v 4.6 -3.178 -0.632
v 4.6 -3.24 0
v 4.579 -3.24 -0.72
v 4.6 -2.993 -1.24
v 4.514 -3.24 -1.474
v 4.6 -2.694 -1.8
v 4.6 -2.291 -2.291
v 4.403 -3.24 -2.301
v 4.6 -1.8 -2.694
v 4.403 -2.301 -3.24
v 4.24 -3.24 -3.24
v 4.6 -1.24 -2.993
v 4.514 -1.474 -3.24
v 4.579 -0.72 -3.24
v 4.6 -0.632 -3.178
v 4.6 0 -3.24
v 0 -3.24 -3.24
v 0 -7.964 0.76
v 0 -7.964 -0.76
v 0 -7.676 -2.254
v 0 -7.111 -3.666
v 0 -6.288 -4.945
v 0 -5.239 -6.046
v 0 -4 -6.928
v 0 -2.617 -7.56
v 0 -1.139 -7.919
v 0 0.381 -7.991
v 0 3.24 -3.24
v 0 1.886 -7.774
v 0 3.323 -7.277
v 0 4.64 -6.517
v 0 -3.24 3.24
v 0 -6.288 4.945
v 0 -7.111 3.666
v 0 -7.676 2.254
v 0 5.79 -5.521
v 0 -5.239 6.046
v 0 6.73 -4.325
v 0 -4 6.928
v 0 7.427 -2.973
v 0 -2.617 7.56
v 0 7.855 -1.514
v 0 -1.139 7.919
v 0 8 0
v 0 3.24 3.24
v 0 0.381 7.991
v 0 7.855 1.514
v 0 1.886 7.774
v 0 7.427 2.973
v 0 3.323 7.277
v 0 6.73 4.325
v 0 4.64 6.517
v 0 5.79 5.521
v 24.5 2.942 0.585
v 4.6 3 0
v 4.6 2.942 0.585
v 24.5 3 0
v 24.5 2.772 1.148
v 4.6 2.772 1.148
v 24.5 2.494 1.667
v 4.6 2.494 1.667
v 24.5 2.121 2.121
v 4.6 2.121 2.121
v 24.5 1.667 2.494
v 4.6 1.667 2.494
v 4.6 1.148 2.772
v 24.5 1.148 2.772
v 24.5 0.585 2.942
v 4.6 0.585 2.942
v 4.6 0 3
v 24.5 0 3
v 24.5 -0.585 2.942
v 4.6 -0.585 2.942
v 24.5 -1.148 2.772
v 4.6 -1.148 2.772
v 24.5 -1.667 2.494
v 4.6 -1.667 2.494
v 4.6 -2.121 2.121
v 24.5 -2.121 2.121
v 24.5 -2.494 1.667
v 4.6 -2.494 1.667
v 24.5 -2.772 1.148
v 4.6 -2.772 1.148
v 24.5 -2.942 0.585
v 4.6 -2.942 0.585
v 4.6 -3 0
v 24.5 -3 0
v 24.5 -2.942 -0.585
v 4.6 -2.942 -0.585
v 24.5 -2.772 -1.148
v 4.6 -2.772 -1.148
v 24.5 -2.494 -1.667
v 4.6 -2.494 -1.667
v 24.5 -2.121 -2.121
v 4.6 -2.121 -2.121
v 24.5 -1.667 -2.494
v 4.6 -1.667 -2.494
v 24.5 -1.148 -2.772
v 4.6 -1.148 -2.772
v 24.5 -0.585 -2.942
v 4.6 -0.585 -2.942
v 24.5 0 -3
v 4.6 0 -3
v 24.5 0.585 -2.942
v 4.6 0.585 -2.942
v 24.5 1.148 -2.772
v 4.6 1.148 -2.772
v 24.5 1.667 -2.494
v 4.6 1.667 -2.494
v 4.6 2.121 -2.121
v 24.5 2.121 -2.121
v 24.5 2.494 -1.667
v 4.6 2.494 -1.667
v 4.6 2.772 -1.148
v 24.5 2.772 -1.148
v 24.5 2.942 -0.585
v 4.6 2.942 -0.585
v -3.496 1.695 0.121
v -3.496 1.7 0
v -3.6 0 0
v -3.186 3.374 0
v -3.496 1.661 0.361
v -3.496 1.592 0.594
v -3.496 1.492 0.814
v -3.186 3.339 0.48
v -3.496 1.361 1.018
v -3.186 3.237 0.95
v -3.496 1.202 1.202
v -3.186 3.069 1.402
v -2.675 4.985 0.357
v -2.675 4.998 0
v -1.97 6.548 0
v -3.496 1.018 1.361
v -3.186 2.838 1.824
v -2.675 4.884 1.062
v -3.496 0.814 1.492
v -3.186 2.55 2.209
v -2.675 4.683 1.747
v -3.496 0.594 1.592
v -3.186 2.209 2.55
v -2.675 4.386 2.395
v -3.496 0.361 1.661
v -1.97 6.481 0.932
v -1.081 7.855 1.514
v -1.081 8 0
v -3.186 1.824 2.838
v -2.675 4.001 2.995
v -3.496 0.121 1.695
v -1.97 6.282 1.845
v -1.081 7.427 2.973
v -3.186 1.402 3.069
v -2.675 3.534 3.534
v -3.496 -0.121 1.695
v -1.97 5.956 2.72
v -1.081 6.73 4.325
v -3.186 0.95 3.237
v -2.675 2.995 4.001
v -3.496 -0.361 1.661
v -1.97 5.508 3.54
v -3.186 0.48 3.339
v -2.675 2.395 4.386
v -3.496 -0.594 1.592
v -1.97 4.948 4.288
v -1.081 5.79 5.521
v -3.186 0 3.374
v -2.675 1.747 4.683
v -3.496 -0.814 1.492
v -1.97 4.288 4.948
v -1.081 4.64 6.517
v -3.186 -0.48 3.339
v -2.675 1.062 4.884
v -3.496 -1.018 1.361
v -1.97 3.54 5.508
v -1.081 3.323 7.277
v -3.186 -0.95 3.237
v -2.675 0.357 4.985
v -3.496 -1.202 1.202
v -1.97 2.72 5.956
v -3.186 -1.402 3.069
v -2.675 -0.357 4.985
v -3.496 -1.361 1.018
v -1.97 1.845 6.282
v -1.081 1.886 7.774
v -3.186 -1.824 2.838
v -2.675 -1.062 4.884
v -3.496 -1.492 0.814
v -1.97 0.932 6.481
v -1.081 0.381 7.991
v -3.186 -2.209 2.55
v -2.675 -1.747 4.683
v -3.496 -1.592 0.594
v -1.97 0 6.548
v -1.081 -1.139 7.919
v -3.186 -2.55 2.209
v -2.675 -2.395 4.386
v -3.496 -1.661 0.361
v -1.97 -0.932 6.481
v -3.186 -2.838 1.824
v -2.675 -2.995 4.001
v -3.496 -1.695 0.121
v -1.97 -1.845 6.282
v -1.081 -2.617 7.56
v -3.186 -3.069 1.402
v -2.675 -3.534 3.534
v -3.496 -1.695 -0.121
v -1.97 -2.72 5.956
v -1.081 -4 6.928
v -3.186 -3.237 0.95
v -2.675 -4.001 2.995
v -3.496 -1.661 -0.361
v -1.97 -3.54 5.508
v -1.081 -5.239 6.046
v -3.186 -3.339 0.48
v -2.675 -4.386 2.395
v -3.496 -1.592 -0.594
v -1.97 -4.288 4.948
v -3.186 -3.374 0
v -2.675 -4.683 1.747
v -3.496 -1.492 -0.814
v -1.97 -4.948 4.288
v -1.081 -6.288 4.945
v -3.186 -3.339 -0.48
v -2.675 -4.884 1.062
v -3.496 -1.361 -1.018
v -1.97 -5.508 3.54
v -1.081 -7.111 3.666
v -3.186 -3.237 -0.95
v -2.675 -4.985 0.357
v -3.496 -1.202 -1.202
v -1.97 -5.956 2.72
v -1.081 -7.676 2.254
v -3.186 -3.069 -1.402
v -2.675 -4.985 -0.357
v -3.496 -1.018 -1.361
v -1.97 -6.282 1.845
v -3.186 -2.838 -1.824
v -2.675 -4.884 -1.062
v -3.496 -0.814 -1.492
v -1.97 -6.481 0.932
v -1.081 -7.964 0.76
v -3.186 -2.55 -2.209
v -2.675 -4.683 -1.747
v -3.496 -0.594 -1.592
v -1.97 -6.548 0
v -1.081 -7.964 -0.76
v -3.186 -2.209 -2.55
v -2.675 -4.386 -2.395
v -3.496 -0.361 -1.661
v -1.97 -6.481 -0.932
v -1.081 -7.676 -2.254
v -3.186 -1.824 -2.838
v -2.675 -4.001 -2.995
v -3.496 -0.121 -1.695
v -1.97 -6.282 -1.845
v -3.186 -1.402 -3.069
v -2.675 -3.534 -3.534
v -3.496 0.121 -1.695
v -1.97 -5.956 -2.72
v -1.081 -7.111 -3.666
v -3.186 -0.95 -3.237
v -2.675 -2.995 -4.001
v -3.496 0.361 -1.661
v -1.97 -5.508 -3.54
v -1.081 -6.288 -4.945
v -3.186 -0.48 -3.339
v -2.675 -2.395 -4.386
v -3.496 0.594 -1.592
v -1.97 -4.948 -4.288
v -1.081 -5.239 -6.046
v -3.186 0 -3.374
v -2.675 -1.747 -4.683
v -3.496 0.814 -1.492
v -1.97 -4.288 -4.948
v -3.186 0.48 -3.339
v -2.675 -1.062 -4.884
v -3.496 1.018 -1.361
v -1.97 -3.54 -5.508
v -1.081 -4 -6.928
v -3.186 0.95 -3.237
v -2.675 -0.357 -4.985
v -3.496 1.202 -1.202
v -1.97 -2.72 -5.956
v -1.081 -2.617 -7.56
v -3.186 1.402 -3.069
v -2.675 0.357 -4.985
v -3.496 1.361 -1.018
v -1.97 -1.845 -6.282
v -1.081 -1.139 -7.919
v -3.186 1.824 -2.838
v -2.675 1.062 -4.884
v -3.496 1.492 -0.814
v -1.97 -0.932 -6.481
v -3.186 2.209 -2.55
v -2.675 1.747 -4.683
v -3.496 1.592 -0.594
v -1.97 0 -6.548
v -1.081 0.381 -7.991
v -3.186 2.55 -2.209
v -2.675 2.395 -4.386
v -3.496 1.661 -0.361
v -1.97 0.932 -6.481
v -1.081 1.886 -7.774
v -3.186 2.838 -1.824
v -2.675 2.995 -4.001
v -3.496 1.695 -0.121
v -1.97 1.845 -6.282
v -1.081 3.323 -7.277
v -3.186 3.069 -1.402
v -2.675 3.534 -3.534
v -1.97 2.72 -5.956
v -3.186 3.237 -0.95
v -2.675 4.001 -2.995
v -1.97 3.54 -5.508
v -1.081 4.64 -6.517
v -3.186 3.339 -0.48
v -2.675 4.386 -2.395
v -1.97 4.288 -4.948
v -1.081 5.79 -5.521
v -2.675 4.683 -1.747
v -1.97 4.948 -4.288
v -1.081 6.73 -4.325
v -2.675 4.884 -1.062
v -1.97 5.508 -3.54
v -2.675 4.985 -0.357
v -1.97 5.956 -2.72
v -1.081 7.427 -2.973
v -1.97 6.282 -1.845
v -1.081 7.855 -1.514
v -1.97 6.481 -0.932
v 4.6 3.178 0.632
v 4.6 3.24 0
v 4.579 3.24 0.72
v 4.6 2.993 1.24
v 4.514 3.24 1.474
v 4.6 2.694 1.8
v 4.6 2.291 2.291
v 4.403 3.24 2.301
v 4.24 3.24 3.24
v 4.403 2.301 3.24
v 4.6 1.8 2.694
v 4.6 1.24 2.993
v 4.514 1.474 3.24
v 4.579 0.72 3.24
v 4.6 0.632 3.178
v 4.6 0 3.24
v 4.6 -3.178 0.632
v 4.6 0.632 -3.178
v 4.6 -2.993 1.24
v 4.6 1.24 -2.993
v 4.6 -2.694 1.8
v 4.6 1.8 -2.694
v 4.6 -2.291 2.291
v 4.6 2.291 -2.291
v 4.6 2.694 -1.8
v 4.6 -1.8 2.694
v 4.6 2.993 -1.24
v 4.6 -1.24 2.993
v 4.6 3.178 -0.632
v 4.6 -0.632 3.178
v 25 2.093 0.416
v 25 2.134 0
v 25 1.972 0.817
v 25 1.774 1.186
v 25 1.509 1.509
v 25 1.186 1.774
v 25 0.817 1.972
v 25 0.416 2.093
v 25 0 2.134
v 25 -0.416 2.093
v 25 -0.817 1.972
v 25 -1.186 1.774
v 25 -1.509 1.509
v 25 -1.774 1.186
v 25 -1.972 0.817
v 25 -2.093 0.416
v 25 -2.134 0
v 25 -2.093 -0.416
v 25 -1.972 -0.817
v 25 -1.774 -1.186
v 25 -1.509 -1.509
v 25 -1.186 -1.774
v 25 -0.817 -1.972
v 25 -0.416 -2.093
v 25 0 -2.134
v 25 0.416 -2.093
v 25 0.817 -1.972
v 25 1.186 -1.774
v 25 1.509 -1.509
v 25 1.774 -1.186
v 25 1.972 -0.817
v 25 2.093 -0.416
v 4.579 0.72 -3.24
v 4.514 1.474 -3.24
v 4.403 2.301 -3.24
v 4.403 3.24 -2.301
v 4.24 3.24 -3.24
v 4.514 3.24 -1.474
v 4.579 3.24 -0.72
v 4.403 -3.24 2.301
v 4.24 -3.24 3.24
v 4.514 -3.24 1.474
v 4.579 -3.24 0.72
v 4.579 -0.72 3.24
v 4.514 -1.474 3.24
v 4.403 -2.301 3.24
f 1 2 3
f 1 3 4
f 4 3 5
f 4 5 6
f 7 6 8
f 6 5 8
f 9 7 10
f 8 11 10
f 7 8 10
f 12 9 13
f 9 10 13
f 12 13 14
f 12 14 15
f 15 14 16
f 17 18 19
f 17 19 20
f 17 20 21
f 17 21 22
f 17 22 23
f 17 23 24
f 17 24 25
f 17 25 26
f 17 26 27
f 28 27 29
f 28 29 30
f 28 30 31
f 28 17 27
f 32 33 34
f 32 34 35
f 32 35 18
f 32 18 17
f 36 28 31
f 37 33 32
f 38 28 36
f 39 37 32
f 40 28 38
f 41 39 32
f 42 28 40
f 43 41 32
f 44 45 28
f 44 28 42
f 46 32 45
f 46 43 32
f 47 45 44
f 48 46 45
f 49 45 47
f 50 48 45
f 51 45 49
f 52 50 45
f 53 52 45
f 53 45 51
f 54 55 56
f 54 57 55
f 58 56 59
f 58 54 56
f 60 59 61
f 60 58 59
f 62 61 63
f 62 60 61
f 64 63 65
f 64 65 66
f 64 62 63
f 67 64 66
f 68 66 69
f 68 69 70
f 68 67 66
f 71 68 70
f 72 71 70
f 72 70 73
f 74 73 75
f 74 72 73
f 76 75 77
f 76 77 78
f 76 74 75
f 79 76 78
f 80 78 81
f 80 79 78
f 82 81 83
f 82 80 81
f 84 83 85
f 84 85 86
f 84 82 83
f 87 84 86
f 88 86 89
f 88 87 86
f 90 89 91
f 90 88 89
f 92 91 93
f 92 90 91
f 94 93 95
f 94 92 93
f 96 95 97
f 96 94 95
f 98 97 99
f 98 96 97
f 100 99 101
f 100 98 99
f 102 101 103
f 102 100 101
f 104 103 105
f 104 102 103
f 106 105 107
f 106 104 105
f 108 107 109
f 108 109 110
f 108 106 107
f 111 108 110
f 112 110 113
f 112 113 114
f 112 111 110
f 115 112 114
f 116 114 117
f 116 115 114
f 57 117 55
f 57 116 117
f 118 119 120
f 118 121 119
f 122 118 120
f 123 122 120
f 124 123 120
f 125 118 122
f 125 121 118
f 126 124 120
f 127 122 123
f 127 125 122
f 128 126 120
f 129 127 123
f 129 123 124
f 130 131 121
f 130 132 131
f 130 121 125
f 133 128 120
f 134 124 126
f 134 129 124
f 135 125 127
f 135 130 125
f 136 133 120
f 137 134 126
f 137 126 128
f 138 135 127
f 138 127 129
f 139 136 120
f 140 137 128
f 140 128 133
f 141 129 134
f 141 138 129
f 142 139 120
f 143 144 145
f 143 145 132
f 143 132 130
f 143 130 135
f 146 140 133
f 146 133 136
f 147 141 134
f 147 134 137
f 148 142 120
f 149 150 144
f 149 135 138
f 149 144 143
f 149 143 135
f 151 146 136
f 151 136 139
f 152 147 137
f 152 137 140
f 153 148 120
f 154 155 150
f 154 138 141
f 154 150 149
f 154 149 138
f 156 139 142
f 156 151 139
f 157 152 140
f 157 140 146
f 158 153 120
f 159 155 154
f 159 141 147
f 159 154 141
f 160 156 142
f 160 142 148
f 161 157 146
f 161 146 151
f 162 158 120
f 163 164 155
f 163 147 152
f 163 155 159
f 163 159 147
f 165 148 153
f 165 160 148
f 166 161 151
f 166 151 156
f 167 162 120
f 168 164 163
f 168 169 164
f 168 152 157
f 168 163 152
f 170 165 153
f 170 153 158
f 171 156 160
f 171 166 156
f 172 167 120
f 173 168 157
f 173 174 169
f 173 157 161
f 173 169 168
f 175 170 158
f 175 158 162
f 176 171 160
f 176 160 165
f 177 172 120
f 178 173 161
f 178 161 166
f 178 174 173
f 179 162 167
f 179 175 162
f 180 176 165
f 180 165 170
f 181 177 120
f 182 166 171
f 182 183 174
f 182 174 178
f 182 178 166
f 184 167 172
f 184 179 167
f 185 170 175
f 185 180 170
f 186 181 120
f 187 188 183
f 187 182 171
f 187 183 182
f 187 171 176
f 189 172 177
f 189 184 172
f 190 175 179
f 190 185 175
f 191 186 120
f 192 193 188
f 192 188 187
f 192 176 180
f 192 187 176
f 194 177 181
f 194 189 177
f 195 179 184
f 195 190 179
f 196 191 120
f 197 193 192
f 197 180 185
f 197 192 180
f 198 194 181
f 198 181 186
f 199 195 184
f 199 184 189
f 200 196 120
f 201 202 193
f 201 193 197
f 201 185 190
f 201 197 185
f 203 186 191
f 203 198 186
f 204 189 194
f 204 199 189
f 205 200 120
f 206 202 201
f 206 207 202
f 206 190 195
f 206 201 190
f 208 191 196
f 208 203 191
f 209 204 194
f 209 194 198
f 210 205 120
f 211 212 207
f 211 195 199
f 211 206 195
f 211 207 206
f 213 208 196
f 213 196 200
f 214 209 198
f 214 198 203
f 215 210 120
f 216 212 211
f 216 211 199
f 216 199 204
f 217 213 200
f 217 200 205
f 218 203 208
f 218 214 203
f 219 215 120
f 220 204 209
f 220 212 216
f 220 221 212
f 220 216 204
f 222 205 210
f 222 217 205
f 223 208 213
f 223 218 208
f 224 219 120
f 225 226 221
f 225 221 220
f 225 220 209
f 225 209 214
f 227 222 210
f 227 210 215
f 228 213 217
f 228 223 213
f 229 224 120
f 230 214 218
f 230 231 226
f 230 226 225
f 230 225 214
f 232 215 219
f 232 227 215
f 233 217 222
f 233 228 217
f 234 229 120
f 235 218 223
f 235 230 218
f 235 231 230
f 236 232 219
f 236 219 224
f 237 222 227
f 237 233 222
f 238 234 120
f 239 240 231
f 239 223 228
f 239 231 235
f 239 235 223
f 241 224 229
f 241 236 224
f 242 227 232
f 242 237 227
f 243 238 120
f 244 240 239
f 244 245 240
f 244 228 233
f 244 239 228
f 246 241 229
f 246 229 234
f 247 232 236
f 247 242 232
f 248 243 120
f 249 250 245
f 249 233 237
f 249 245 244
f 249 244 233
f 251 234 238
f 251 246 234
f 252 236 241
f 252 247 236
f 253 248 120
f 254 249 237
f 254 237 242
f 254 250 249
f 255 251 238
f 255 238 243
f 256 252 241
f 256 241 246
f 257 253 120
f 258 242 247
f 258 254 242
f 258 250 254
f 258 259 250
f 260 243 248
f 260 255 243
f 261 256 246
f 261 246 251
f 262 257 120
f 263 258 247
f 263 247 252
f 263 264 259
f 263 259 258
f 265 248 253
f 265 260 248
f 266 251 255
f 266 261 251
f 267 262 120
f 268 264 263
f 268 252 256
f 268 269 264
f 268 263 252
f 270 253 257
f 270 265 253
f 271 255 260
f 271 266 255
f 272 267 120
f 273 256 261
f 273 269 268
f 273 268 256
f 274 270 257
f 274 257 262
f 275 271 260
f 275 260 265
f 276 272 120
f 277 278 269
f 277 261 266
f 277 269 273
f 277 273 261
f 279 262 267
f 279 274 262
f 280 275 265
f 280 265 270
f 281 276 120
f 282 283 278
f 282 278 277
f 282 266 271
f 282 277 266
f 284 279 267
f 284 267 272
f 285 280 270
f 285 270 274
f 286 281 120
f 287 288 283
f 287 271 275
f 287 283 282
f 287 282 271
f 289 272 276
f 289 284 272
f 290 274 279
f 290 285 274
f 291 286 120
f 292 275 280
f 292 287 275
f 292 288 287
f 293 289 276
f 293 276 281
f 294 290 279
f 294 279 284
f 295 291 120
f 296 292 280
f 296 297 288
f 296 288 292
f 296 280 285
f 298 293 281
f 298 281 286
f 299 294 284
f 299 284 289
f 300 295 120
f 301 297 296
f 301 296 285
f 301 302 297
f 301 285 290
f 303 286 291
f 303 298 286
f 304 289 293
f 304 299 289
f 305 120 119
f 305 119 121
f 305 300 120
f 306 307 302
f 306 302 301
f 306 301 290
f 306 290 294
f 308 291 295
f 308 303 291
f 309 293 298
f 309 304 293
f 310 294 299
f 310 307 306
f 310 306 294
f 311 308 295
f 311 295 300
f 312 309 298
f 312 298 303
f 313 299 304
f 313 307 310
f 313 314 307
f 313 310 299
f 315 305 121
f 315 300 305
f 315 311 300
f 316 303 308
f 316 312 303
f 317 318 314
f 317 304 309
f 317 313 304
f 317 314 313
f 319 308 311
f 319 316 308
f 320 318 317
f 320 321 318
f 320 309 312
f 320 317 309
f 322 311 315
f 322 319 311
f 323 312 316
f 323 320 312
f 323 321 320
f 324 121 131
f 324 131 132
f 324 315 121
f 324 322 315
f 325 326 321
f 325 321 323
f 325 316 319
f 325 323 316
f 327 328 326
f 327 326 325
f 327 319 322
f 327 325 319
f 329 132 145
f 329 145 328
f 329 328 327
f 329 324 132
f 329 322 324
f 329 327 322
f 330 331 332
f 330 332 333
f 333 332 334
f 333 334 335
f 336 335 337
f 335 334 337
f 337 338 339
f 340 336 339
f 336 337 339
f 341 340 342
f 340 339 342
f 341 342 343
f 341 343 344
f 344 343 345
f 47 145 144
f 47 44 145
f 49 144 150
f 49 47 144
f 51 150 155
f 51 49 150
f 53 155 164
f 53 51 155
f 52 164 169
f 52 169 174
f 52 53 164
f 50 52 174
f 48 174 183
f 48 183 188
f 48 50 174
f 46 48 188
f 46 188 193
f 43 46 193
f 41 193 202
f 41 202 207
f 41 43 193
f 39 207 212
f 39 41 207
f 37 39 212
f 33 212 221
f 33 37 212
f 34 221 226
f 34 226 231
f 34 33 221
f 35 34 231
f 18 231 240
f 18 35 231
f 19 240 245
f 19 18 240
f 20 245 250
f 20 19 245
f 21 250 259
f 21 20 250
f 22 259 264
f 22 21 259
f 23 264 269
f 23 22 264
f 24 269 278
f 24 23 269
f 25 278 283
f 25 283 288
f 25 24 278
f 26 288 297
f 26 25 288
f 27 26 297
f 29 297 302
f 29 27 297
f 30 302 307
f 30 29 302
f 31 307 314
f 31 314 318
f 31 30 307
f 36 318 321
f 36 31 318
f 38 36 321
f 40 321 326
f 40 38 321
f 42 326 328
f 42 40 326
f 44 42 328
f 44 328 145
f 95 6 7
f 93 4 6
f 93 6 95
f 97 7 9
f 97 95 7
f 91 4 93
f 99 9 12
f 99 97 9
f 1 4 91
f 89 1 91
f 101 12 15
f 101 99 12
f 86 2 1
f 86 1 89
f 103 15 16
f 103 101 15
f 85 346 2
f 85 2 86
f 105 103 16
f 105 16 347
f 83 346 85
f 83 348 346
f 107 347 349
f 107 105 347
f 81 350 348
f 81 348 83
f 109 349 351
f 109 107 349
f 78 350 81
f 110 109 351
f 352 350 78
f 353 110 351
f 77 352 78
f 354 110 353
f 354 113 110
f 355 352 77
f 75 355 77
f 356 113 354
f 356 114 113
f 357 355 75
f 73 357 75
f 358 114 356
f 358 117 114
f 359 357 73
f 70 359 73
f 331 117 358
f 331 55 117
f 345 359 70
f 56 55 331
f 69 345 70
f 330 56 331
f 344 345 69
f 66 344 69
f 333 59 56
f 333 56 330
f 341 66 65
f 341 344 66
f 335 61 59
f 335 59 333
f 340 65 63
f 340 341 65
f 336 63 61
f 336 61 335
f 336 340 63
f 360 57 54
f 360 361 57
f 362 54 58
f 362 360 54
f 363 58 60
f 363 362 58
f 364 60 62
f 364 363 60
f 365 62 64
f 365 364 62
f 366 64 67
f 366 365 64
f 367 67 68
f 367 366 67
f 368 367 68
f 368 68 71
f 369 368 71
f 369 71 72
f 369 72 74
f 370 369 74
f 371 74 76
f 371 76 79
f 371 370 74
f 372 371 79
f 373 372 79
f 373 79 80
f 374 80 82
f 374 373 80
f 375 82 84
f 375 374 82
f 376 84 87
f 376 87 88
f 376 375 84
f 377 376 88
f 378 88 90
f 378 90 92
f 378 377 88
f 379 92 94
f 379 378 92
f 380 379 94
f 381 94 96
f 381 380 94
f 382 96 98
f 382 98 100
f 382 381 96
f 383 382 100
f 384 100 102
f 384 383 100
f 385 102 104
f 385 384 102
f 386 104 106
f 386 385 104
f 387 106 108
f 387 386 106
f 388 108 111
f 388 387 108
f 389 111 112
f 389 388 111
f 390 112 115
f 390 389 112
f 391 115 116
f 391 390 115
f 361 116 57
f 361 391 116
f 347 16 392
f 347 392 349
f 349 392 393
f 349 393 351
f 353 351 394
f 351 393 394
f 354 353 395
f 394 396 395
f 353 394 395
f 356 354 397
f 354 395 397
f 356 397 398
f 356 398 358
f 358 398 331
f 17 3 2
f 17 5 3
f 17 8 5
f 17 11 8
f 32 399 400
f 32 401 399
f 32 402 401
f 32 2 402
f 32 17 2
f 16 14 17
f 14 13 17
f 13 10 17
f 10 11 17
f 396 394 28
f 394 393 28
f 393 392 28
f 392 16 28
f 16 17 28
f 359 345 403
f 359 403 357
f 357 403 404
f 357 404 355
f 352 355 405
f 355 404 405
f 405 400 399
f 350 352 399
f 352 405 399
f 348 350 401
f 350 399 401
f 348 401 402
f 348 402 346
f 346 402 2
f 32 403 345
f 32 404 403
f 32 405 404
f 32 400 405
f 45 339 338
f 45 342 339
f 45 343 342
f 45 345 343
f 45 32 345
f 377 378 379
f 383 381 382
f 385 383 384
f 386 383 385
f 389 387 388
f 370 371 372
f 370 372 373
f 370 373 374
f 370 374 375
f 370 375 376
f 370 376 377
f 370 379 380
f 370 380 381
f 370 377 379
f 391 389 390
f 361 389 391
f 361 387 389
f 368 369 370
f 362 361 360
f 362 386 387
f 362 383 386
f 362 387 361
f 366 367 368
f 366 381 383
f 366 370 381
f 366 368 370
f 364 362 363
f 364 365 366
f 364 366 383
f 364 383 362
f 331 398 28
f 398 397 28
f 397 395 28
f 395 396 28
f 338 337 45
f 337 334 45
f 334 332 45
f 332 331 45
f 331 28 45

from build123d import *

# Parameters (mm, degrees)
CUT_REVOLVE_1_2_OUTLINE_W = 6.48
CUT_REVOLVE_1_2_OUTLINE_H = 6.48
CUT_REVOLVE_1_2_DEPTH     = 4.6


with BuildPart() as part:
    # 草图1 → Revolve 699 (revolve)
    with BuildSketch(Plane.XY):
        with BuildLine():
            Line((-1.081081081, 8), (0, 8))
            Line((0, 8), (0, 0))
            Line((0, 0), (-3.6, 0))
            ThreePointArc((-3.6, 0), (-2.955391275, 4.193594893), (-1.081081081, 8))
        make_face()
    revolve(axis=Axis((-3.6, 0, 0), (1, 0, 0)))



with BuildPart() as body_2:
    # 切除-旋转1: read off the stored shape, not the designer's step
    # 切除-旋转1 outline → 切除-旋转1 (revolve)
    with BuildSketch(Plane.YX):
        Polygon((3, 24.500014667), (2.134, 25), (0, 25), (0, 4.240398306), (3, 4.240398306), align=None)
    revolve(axis=Axis((0, 0, 0), (1, 0, 0)))


with BuildPart() as part_1:
    add(part.part)

    add(body_2.part)  # Cut-Revolve 1 2 merges body 2
    # Cut-Revolve 1 2 outline → Cut-Revolve 1 2 (add)
    with BuildSketch(Plane.YZ):
        Rectangle(CUT_REVOLVE_1_2_OUTLINE_W, CUT_REVOLVE_1_2_OUTLINE_H)
    extrude(amount=CUT_REVOLVE_1_2_DEPTH)

    # Cut-Revolve 1 3 outline → Cut-Revolve 1 3 (revolve, cut)
    with BuildSketch(Plane.YX):
        Polygon((4.582051794, 4.6), (3.24, 4.6), (4.582051794, 4.240398306), align=None)
    revolve(axis=Axis((0, 0, 0), (1, 0, 0)), mode=Mode.SUBTRACT)


solid = part_1.part
